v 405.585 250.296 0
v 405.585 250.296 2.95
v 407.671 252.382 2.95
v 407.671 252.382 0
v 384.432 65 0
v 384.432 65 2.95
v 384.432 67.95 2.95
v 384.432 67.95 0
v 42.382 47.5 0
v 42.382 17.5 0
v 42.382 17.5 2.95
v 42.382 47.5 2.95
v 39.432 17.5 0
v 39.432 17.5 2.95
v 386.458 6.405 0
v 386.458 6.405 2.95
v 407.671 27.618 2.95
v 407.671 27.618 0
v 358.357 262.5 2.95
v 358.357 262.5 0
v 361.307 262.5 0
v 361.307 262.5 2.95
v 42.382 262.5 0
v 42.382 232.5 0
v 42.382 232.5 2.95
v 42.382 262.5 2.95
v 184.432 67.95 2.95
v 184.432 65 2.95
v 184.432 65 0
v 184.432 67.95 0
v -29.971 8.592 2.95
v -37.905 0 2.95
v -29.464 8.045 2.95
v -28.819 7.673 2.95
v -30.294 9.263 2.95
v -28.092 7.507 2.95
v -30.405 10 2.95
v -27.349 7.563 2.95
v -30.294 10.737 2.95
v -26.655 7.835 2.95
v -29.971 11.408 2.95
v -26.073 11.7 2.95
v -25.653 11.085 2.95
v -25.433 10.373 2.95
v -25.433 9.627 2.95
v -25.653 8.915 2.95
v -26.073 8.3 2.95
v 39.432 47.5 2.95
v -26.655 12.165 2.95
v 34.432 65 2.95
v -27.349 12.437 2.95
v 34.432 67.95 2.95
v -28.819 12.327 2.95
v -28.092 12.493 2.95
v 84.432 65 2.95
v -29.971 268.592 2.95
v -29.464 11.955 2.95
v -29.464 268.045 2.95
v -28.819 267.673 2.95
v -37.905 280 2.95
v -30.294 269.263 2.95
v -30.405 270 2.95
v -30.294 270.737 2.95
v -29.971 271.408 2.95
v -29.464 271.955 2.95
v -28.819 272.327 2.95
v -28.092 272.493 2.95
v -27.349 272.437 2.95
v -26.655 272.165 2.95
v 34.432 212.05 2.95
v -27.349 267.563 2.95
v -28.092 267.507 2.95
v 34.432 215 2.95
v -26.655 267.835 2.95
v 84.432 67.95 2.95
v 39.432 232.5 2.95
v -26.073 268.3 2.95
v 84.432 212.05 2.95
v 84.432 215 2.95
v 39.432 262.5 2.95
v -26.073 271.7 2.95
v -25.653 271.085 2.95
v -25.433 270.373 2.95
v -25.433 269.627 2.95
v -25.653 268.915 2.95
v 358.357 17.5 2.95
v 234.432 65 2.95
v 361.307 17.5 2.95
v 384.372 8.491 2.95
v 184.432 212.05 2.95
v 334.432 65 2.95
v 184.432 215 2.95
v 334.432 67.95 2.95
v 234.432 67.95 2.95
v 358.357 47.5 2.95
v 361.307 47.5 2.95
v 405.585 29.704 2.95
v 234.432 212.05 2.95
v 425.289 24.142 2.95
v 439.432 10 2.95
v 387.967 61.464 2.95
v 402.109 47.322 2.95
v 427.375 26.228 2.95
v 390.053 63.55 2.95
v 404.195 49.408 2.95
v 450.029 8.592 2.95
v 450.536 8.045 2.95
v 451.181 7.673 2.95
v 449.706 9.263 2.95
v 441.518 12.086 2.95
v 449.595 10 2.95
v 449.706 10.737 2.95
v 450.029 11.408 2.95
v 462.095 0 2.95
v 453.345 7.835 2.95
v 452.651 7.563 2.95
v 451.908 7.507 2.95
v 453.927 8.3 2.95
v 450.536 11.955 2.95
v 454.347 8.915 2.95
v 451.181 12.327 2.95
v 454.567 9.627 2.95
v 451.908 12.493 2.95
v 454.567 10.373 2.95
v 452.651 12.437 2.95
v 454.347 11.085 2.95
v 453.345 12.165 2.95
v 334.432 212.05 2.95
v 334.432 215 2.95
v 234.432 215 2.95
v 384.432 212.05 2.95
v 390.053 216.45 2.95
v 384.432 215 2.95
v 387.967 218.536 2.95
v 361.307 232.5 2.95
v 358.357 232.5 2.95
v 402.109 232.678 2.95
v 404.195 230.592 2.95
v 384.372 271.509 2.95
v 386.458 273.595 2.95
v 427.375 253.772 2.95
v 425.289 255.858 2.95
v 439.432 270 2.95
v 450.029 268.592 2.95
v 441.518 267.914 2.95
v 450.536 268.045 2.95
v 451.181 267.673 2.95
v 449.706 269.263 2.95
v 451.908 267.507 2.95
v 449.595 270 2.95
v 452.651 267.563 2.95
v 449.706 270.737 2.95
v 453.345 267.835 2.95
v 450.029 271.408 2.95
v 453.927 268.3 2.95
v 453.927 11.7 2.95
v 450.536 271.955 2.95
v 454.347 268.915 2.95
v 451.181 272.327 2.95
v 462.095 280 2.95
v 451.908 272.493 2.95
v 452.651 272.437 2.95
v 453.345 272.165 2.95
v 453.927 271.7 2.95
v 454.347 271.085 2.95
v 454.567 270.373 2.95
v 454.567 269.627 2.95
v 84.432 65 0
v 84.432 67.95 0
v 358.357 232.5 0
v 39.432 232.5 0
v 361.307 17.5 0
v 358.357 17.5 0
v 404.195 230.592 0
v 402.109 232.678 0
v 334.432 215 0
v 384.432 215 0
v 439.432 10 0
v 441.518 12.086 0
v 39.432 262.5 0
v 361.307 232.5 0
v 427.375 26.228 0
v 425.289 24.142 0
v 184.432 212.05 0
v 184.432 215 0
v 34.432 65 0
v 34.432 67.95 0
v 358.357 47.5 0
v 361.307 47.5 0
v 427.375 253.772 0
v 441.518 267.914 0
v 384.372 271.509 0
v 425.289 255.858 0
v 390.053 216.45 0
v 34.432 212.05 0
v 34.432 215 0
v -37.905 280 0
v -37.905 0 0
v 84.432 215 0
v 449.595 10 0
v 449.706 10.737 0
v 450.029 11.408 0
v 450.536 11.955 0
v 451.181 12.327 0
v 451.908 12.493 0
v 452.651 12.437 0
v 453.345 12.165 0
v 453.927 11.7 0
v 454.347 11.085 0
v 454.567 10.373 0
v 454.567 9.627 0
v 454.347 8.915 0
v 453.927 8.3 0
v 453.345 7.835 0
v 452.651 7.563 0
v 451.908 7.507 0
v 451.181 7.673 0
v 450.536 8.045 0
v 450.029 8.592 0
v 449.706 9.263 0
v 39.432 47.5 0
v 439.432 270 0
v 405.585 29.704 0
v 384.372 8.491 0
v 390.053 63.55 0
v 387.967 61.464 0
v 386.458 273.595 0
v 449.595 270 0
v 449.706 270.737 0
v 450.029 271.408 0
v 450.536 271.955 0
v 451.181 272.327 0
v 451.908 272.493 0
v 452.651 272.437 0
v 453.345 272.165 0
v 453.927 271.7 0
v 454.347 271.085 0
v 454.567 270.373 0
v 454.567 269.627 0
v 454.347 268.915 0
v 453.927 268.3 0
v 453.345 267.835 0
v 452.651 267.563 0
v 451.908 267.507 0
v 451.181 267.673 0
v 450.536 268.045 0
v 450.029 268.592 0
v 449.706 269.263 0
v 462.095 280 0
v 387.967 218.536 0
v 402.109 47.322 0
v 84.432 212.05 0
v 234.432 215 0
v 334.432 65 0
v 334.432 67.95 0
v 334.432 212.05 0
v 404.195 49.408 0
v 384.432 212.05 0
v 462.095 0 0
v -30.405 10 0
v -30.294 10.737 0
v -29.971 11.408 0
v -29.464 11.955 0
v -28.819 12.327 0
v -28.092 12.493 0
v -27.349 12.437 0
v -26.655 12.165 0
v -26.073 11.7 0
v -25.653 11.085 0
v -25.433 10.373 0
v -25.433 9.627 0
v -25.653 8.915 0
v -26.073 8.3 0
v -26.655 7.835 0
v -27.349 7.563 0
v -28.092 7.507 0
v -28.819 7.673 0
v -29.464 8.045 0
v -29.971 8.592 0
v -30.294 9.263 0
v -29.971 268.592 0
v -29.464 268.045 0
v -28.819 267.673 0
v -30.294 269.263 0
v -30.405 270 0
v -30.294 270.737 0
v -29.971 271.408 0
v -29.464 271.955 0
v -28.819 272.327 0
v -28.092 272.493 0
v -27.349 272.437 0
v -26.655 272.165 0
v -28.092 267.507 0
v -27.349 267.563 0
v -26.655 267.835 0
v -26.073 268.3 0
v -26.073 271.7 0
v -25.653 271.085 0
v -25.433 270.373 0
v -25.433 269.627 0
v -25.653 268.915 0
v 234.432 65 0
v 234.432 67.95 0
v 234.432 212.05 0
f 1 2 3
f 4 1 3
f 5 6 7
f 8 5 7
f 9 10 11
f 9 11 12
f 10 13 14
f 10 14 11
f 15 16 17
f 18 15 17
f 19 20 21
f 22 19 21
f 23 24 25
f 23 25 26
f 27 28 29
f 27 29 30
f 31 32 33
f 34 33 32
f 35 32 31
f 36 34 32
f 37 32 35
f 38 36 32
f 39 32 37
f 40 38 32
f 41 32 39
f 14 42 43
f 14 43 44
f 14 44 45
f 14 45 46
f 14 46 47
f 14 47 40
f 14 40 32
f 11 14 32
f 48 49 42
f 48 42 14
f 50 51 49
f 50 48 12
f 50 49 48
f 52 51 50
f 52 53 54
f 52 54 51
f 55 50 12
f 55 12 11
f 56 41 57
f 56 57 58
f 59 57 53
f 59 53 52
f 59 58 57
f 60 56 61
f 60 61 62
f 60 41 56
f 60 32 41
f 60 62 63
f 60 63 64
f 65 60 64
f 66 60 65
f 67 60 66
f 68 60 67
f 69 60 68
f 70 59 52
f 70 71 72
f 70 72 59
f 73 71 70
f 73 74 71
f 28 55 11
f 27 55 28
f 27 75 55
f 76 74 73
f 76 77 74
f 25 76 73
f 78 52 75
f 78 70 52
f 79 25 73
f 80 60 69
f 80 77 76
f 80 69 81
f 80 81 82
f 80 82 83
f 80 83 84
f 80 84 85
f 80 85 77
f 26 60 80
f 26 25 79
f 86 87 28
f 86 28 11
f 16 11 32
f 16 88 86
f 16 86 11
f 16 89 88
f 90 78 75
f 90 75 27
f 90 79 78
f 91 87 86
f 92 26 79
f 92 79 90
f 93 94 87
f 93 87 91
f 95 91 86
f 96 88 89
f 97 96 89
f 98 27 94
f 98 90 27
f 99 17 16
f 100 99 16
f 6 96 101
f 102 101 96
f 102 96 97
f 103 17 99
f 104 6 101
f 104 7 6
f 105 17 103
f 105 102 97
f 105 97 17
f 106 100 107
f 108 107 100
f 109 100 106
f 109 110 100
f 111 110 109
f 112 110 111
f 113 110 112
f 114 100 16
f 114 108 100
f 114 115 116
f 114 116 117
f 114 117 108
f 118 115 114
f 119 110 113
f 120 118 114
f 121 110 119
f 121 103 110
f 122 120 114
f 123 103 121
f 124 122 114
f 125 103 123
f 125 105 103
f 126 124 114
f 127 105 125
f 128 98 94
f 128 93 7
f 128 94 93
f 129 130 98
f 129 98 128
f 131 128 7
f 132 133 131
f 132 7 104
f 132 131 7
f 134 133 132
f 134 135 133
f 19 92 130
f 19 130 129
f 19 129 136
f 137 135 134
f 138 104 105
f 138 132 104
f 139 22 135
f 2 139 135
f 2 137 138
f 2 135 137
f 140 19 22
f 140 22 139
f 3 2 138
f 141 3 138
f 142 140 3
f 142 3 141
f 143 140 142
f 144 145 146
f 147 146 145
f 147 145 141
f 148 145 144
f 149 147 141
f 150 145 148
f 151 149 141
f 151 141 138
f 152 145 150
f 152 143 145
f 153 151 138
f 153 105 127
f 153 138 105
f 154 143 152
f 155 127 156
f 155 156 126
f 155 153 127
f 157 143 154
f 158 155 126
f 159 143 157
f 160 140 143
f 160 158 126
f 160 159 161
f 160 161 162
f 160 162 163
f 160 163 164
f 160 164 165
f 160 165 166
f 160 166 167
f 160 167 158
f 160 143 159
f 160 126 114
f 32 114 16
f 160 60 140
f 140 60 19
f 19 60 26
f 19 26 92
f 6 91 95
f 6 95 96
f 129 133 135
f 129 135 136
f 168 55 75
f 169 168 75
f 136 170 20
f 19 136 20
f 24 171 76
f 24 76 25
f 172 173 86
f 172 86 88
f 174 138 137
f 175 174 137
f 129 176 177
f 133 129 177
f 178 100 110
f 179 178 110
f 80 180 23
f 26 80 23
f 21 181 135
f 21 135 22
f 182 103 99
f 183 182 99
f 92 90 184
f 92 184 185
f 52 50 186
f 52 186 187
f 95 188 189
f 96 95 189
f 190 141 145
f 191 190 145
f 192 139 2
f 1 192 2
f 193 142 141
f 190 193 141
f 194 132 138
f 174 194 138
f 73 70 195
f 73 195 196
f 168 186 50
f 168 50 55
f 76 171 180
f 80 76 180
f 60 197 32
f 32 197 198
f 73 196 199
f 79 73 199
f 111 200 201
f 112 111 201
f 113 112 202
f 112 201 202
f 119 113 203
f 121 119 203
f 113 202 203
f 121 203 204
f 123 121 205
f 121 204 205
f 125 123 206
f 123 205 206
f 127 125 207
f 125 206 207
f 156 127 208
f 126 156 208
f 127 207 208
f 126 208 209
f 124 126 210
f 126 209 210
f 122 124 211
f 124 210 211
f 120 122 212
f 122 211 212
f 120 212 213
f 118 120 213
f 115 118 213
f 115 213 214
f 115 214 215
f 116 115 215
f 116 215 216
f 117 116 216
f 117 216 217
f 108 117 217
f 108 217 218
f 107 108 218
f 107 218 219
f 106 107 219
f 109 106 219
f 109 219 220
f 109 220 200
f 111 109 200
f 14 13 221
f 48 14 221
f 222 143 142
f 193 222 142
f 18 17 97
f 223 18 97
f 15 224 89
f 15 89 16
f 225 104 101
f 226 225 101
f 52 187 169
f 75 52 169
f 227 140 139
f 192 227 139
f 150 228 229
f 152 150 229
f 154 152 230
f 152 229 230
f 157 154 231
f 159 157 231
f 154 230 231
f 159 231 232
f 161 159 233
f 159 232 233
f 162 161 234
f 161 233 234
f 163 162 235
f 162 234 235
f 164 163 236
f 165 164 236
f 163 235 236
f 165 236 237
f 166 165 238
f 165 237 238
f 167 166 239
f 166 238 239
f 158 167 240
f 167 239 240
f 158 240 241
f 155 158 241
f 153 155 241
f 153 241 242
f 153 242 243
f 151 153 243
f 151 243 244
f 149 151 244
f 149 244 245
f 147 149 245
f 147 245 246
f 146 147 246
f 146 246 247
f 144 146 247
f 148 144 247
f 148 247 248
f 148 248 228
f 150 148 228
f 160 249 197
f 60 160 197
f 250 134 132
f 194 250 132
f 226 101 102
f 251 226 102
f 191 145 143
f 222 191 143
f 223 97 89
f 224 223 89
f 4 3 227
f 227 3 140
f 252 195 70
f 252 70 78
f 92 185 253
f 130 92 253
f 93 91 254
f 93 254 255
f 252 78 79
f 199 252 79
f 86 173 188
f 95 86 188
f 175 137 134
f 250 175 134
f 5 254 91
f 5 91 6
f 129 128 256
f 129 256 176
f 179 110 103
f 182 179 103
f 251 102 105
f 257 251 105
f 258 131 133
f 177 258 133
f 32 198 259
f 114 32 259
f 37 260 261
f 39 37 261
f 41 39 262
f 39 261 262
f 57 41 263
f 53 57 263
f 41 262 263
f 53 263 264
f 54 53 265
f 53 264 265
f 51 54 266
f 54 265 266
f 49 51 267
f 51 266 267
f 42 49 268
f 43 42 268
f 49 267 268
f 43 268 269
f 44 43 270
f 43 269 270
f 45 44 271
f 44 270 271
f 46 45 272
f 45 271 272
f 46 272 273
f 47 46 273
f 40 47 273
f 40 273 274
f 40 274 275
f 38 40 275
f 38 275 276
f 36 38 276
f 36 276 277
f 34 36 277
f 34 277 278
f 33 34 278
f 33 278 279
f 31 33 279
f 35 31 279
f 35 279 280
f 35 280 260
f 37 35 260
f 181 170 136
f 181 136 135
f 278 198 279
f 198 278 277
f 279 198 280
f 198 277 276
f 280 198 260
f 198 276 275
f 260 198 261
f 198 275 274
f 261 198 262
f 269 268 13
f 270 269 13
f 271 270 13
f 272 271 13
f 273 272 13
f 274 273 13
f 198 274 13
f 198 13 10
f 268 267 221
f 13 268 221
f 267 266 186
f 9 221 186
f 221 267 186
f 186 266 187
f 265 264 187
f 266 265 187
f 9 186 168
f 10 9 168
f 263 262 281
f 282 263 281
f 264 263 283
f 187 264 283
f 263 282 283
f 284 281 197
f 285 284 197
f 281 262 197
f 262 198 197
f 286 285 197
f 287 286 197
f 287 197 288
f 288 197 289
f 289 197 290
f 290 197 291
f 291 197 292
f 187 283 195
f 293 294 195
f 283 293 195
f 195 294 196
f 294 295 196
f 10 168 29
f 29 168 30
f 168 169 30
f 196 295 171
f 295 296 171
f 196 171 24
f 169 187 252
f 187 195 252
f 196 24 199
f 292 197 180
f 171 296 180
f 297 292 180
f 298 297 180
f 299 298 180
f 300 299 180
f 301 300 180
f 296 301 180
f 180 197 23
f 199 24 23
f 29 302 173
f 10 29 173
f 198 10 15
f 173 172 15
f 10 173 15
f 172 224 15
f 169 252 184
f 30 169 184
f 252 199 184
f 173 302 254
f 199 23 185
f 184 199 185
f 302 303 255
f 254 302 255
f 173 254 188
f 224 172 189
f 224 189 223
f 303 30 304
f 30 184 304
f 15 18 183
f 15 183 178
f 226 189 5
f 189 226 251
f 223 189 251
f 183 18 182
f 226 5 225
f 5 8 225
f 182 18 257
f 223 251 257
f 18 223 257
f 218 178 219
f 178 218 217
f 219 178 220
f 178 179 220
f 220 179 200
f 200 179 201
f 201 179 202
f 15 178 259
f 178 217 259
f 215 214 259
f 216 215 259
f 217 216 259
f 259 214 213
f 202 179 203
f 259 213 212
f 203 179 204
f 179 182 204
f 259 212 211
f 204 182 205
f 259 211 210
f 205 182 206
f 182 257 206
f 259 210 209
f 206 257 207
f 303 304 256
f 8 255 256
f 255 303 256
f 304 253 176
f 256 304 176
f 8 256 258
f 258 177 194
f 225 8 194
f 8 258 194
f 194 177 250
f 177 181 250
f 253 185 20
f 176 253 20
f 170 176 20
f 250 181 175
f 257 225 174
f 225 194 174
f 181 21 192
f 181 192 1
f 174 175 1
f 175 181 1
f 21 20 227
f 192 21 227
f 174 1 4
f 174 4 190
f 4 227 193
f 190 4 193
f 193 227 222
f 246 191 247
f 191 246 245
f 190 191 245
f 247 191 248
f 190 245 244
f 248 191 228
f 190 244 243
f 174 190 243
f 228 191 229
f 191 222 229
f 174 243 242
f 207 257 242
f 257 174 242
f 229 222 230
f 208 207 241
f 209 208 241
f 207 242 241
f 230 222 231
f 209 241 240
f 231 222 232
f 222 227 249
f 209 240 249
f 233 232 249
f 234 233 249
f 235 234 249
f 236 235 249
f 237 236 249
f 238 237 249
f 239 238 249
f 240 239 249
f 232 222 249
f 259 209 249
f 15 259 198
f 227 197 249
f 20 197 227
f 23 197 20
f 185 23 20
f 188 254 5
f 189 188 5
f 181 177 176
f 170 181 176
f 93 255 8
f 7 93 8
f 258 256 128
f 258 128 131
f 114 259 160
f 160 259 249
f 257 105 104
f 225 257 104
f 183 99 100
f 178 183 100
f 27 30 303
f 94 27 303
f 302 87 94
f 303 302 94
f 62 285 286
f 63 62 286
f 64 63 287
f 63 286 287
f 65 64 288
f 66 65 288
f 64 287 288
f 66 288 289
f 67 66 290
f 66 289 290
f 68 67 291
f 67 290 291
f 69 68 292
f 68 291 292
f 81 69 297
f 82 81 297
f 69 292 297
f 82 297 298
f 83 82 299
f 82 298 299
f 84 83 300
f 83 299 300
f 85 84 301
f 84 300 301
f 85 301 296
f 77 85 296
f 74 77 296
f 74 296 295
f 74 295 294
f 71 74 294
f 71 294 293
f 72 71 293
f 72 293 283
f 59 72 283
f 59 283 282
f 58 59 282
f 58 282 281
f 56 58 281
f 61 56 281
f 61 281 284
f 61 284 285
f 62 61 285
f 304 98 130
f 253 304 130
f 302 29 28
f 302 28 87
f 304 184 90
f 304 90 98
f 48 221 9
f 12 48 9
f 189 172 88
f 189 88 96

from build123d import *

# Parameters (mm, degrees)
F0_W     = 2.95
F0_H     = 30
F0_W_2   = 50
F0_H_2   = 2.95
F1_DEPTH = 2.95
F3_D     = 5
F5_DEPTH = 2.95


# Not quite as in the source:
# - a feature names something its author has since deleted; it is built from what else it names


with BuildPart() as f1:
    # F0 (on Top) → F1 (new body)
    with BuildSketch(Plane.XY):
        Polygon((-37.9051826894, 0), (12.0948173106, 0), (462.0948173106, 0), (462.0948173106, 280), (62.0948173106, 280), (-37.9051826894, 280), align=None)
        with Locations((40.9065613726, 32.5)):
            Rectangle(F0_W, F0_H, mode=Mode.SUBTRACT)
        with Locations((59.4315613726, 66.475)):
            Rectangle(F0_W_2, F0_H_2, mode=Mode.SUBTRACT)
        with Locations((209.4315613726, 66.475)):
            Rectangle(F0_W_2, F0_H_2, mode=Mode.SUBTRACT)
        with Locations((359.8315613726, 32.5)):
            Rectangle(F0_W, F0_H, mode=Mode.SUBTRACT)
        with Locations((359.4315613726, 66.475)):
            Rectangle(F0_W_2, F0_H_2, mode=Mode.SUBTRACT)
        with Locations((59.4315613726, 213.525)):
            Rectangle(F0_W_2, F0_H_2, mode=Mode.SUBTRACT)
        with Locations((40.9065613726, 247.5)):
            Rectangle(F0_W, F0_H, mode=Mode.SUBTRACT)
        with Locations((209.4315613726, 213.525)):
            Rectangle(F0_W_2, F0_H_2, mode=Mode.SUBTRACT)
        with Locations((359.4315613726, 213.525)):
            Rectangle(F0_W_2, F0_H_2, mode=Mode.SUBTRACT)
        with Locations((359.8315613726, 247.5)):
            Rectangle(F0_W, F0_H, mode=Mode.SUBTRACT)
    extrude(amount=F1_DEPTH)

    # F3 (through all)
    with Locations(Plane.XY.offset(2.95)):
        with Locations((-27.9051826894, 10), (-27.9051826894, 270), (452.0948173106, 10), (452.0948173106, 270)):
            Hole(F3_D / 2)

    # F4 (on face) → F5 (cut)
    with BuildSketch(Plane.XY.offset(2.95)):
        Polygon((402.1092280247, 232.6776666521), (387.9670924009, 218.5355310284), (390.0530574054, 216.4495660239), (404.1951930292, 230.5917016476), align=None)
        Polygon((441.5175263771, 267.9140349955), (439.4315613726, 270), (425.2894257488, 255.8578643763), (427.3753907533, 253.7718993718), align=None)
        Polygon((386.4580381415, 273.5950192639), (384.372073137, 271.5090542594), (405.5852765726, 250.2958508238), (407.6712415771, 252.3818158283), align=None)
        Polygon((386.4580381415, 6.4049807361), (407.6712415771, 27.6181841717), (405.5852765726, 29.7041491762), (384.372073137, 8.4909457406), align=None)
        Polygon((427.3753907533, 26.2281006282), (425.2894257488, 24.1421356237), (439.4315613726, 10), (441.5175263771, 12.0859650045), align=None)
        Polygon((387.9670924009, 61.4644689716), (402.1092280247, 47.3223333479), (404.1951930292, 49.4082983524), (390.0530574054, 63.5504339761), align=None)
    extrude(amount=-F5_DEPTH, mode=Mode.SUBTRACT)


solid = f1.part
